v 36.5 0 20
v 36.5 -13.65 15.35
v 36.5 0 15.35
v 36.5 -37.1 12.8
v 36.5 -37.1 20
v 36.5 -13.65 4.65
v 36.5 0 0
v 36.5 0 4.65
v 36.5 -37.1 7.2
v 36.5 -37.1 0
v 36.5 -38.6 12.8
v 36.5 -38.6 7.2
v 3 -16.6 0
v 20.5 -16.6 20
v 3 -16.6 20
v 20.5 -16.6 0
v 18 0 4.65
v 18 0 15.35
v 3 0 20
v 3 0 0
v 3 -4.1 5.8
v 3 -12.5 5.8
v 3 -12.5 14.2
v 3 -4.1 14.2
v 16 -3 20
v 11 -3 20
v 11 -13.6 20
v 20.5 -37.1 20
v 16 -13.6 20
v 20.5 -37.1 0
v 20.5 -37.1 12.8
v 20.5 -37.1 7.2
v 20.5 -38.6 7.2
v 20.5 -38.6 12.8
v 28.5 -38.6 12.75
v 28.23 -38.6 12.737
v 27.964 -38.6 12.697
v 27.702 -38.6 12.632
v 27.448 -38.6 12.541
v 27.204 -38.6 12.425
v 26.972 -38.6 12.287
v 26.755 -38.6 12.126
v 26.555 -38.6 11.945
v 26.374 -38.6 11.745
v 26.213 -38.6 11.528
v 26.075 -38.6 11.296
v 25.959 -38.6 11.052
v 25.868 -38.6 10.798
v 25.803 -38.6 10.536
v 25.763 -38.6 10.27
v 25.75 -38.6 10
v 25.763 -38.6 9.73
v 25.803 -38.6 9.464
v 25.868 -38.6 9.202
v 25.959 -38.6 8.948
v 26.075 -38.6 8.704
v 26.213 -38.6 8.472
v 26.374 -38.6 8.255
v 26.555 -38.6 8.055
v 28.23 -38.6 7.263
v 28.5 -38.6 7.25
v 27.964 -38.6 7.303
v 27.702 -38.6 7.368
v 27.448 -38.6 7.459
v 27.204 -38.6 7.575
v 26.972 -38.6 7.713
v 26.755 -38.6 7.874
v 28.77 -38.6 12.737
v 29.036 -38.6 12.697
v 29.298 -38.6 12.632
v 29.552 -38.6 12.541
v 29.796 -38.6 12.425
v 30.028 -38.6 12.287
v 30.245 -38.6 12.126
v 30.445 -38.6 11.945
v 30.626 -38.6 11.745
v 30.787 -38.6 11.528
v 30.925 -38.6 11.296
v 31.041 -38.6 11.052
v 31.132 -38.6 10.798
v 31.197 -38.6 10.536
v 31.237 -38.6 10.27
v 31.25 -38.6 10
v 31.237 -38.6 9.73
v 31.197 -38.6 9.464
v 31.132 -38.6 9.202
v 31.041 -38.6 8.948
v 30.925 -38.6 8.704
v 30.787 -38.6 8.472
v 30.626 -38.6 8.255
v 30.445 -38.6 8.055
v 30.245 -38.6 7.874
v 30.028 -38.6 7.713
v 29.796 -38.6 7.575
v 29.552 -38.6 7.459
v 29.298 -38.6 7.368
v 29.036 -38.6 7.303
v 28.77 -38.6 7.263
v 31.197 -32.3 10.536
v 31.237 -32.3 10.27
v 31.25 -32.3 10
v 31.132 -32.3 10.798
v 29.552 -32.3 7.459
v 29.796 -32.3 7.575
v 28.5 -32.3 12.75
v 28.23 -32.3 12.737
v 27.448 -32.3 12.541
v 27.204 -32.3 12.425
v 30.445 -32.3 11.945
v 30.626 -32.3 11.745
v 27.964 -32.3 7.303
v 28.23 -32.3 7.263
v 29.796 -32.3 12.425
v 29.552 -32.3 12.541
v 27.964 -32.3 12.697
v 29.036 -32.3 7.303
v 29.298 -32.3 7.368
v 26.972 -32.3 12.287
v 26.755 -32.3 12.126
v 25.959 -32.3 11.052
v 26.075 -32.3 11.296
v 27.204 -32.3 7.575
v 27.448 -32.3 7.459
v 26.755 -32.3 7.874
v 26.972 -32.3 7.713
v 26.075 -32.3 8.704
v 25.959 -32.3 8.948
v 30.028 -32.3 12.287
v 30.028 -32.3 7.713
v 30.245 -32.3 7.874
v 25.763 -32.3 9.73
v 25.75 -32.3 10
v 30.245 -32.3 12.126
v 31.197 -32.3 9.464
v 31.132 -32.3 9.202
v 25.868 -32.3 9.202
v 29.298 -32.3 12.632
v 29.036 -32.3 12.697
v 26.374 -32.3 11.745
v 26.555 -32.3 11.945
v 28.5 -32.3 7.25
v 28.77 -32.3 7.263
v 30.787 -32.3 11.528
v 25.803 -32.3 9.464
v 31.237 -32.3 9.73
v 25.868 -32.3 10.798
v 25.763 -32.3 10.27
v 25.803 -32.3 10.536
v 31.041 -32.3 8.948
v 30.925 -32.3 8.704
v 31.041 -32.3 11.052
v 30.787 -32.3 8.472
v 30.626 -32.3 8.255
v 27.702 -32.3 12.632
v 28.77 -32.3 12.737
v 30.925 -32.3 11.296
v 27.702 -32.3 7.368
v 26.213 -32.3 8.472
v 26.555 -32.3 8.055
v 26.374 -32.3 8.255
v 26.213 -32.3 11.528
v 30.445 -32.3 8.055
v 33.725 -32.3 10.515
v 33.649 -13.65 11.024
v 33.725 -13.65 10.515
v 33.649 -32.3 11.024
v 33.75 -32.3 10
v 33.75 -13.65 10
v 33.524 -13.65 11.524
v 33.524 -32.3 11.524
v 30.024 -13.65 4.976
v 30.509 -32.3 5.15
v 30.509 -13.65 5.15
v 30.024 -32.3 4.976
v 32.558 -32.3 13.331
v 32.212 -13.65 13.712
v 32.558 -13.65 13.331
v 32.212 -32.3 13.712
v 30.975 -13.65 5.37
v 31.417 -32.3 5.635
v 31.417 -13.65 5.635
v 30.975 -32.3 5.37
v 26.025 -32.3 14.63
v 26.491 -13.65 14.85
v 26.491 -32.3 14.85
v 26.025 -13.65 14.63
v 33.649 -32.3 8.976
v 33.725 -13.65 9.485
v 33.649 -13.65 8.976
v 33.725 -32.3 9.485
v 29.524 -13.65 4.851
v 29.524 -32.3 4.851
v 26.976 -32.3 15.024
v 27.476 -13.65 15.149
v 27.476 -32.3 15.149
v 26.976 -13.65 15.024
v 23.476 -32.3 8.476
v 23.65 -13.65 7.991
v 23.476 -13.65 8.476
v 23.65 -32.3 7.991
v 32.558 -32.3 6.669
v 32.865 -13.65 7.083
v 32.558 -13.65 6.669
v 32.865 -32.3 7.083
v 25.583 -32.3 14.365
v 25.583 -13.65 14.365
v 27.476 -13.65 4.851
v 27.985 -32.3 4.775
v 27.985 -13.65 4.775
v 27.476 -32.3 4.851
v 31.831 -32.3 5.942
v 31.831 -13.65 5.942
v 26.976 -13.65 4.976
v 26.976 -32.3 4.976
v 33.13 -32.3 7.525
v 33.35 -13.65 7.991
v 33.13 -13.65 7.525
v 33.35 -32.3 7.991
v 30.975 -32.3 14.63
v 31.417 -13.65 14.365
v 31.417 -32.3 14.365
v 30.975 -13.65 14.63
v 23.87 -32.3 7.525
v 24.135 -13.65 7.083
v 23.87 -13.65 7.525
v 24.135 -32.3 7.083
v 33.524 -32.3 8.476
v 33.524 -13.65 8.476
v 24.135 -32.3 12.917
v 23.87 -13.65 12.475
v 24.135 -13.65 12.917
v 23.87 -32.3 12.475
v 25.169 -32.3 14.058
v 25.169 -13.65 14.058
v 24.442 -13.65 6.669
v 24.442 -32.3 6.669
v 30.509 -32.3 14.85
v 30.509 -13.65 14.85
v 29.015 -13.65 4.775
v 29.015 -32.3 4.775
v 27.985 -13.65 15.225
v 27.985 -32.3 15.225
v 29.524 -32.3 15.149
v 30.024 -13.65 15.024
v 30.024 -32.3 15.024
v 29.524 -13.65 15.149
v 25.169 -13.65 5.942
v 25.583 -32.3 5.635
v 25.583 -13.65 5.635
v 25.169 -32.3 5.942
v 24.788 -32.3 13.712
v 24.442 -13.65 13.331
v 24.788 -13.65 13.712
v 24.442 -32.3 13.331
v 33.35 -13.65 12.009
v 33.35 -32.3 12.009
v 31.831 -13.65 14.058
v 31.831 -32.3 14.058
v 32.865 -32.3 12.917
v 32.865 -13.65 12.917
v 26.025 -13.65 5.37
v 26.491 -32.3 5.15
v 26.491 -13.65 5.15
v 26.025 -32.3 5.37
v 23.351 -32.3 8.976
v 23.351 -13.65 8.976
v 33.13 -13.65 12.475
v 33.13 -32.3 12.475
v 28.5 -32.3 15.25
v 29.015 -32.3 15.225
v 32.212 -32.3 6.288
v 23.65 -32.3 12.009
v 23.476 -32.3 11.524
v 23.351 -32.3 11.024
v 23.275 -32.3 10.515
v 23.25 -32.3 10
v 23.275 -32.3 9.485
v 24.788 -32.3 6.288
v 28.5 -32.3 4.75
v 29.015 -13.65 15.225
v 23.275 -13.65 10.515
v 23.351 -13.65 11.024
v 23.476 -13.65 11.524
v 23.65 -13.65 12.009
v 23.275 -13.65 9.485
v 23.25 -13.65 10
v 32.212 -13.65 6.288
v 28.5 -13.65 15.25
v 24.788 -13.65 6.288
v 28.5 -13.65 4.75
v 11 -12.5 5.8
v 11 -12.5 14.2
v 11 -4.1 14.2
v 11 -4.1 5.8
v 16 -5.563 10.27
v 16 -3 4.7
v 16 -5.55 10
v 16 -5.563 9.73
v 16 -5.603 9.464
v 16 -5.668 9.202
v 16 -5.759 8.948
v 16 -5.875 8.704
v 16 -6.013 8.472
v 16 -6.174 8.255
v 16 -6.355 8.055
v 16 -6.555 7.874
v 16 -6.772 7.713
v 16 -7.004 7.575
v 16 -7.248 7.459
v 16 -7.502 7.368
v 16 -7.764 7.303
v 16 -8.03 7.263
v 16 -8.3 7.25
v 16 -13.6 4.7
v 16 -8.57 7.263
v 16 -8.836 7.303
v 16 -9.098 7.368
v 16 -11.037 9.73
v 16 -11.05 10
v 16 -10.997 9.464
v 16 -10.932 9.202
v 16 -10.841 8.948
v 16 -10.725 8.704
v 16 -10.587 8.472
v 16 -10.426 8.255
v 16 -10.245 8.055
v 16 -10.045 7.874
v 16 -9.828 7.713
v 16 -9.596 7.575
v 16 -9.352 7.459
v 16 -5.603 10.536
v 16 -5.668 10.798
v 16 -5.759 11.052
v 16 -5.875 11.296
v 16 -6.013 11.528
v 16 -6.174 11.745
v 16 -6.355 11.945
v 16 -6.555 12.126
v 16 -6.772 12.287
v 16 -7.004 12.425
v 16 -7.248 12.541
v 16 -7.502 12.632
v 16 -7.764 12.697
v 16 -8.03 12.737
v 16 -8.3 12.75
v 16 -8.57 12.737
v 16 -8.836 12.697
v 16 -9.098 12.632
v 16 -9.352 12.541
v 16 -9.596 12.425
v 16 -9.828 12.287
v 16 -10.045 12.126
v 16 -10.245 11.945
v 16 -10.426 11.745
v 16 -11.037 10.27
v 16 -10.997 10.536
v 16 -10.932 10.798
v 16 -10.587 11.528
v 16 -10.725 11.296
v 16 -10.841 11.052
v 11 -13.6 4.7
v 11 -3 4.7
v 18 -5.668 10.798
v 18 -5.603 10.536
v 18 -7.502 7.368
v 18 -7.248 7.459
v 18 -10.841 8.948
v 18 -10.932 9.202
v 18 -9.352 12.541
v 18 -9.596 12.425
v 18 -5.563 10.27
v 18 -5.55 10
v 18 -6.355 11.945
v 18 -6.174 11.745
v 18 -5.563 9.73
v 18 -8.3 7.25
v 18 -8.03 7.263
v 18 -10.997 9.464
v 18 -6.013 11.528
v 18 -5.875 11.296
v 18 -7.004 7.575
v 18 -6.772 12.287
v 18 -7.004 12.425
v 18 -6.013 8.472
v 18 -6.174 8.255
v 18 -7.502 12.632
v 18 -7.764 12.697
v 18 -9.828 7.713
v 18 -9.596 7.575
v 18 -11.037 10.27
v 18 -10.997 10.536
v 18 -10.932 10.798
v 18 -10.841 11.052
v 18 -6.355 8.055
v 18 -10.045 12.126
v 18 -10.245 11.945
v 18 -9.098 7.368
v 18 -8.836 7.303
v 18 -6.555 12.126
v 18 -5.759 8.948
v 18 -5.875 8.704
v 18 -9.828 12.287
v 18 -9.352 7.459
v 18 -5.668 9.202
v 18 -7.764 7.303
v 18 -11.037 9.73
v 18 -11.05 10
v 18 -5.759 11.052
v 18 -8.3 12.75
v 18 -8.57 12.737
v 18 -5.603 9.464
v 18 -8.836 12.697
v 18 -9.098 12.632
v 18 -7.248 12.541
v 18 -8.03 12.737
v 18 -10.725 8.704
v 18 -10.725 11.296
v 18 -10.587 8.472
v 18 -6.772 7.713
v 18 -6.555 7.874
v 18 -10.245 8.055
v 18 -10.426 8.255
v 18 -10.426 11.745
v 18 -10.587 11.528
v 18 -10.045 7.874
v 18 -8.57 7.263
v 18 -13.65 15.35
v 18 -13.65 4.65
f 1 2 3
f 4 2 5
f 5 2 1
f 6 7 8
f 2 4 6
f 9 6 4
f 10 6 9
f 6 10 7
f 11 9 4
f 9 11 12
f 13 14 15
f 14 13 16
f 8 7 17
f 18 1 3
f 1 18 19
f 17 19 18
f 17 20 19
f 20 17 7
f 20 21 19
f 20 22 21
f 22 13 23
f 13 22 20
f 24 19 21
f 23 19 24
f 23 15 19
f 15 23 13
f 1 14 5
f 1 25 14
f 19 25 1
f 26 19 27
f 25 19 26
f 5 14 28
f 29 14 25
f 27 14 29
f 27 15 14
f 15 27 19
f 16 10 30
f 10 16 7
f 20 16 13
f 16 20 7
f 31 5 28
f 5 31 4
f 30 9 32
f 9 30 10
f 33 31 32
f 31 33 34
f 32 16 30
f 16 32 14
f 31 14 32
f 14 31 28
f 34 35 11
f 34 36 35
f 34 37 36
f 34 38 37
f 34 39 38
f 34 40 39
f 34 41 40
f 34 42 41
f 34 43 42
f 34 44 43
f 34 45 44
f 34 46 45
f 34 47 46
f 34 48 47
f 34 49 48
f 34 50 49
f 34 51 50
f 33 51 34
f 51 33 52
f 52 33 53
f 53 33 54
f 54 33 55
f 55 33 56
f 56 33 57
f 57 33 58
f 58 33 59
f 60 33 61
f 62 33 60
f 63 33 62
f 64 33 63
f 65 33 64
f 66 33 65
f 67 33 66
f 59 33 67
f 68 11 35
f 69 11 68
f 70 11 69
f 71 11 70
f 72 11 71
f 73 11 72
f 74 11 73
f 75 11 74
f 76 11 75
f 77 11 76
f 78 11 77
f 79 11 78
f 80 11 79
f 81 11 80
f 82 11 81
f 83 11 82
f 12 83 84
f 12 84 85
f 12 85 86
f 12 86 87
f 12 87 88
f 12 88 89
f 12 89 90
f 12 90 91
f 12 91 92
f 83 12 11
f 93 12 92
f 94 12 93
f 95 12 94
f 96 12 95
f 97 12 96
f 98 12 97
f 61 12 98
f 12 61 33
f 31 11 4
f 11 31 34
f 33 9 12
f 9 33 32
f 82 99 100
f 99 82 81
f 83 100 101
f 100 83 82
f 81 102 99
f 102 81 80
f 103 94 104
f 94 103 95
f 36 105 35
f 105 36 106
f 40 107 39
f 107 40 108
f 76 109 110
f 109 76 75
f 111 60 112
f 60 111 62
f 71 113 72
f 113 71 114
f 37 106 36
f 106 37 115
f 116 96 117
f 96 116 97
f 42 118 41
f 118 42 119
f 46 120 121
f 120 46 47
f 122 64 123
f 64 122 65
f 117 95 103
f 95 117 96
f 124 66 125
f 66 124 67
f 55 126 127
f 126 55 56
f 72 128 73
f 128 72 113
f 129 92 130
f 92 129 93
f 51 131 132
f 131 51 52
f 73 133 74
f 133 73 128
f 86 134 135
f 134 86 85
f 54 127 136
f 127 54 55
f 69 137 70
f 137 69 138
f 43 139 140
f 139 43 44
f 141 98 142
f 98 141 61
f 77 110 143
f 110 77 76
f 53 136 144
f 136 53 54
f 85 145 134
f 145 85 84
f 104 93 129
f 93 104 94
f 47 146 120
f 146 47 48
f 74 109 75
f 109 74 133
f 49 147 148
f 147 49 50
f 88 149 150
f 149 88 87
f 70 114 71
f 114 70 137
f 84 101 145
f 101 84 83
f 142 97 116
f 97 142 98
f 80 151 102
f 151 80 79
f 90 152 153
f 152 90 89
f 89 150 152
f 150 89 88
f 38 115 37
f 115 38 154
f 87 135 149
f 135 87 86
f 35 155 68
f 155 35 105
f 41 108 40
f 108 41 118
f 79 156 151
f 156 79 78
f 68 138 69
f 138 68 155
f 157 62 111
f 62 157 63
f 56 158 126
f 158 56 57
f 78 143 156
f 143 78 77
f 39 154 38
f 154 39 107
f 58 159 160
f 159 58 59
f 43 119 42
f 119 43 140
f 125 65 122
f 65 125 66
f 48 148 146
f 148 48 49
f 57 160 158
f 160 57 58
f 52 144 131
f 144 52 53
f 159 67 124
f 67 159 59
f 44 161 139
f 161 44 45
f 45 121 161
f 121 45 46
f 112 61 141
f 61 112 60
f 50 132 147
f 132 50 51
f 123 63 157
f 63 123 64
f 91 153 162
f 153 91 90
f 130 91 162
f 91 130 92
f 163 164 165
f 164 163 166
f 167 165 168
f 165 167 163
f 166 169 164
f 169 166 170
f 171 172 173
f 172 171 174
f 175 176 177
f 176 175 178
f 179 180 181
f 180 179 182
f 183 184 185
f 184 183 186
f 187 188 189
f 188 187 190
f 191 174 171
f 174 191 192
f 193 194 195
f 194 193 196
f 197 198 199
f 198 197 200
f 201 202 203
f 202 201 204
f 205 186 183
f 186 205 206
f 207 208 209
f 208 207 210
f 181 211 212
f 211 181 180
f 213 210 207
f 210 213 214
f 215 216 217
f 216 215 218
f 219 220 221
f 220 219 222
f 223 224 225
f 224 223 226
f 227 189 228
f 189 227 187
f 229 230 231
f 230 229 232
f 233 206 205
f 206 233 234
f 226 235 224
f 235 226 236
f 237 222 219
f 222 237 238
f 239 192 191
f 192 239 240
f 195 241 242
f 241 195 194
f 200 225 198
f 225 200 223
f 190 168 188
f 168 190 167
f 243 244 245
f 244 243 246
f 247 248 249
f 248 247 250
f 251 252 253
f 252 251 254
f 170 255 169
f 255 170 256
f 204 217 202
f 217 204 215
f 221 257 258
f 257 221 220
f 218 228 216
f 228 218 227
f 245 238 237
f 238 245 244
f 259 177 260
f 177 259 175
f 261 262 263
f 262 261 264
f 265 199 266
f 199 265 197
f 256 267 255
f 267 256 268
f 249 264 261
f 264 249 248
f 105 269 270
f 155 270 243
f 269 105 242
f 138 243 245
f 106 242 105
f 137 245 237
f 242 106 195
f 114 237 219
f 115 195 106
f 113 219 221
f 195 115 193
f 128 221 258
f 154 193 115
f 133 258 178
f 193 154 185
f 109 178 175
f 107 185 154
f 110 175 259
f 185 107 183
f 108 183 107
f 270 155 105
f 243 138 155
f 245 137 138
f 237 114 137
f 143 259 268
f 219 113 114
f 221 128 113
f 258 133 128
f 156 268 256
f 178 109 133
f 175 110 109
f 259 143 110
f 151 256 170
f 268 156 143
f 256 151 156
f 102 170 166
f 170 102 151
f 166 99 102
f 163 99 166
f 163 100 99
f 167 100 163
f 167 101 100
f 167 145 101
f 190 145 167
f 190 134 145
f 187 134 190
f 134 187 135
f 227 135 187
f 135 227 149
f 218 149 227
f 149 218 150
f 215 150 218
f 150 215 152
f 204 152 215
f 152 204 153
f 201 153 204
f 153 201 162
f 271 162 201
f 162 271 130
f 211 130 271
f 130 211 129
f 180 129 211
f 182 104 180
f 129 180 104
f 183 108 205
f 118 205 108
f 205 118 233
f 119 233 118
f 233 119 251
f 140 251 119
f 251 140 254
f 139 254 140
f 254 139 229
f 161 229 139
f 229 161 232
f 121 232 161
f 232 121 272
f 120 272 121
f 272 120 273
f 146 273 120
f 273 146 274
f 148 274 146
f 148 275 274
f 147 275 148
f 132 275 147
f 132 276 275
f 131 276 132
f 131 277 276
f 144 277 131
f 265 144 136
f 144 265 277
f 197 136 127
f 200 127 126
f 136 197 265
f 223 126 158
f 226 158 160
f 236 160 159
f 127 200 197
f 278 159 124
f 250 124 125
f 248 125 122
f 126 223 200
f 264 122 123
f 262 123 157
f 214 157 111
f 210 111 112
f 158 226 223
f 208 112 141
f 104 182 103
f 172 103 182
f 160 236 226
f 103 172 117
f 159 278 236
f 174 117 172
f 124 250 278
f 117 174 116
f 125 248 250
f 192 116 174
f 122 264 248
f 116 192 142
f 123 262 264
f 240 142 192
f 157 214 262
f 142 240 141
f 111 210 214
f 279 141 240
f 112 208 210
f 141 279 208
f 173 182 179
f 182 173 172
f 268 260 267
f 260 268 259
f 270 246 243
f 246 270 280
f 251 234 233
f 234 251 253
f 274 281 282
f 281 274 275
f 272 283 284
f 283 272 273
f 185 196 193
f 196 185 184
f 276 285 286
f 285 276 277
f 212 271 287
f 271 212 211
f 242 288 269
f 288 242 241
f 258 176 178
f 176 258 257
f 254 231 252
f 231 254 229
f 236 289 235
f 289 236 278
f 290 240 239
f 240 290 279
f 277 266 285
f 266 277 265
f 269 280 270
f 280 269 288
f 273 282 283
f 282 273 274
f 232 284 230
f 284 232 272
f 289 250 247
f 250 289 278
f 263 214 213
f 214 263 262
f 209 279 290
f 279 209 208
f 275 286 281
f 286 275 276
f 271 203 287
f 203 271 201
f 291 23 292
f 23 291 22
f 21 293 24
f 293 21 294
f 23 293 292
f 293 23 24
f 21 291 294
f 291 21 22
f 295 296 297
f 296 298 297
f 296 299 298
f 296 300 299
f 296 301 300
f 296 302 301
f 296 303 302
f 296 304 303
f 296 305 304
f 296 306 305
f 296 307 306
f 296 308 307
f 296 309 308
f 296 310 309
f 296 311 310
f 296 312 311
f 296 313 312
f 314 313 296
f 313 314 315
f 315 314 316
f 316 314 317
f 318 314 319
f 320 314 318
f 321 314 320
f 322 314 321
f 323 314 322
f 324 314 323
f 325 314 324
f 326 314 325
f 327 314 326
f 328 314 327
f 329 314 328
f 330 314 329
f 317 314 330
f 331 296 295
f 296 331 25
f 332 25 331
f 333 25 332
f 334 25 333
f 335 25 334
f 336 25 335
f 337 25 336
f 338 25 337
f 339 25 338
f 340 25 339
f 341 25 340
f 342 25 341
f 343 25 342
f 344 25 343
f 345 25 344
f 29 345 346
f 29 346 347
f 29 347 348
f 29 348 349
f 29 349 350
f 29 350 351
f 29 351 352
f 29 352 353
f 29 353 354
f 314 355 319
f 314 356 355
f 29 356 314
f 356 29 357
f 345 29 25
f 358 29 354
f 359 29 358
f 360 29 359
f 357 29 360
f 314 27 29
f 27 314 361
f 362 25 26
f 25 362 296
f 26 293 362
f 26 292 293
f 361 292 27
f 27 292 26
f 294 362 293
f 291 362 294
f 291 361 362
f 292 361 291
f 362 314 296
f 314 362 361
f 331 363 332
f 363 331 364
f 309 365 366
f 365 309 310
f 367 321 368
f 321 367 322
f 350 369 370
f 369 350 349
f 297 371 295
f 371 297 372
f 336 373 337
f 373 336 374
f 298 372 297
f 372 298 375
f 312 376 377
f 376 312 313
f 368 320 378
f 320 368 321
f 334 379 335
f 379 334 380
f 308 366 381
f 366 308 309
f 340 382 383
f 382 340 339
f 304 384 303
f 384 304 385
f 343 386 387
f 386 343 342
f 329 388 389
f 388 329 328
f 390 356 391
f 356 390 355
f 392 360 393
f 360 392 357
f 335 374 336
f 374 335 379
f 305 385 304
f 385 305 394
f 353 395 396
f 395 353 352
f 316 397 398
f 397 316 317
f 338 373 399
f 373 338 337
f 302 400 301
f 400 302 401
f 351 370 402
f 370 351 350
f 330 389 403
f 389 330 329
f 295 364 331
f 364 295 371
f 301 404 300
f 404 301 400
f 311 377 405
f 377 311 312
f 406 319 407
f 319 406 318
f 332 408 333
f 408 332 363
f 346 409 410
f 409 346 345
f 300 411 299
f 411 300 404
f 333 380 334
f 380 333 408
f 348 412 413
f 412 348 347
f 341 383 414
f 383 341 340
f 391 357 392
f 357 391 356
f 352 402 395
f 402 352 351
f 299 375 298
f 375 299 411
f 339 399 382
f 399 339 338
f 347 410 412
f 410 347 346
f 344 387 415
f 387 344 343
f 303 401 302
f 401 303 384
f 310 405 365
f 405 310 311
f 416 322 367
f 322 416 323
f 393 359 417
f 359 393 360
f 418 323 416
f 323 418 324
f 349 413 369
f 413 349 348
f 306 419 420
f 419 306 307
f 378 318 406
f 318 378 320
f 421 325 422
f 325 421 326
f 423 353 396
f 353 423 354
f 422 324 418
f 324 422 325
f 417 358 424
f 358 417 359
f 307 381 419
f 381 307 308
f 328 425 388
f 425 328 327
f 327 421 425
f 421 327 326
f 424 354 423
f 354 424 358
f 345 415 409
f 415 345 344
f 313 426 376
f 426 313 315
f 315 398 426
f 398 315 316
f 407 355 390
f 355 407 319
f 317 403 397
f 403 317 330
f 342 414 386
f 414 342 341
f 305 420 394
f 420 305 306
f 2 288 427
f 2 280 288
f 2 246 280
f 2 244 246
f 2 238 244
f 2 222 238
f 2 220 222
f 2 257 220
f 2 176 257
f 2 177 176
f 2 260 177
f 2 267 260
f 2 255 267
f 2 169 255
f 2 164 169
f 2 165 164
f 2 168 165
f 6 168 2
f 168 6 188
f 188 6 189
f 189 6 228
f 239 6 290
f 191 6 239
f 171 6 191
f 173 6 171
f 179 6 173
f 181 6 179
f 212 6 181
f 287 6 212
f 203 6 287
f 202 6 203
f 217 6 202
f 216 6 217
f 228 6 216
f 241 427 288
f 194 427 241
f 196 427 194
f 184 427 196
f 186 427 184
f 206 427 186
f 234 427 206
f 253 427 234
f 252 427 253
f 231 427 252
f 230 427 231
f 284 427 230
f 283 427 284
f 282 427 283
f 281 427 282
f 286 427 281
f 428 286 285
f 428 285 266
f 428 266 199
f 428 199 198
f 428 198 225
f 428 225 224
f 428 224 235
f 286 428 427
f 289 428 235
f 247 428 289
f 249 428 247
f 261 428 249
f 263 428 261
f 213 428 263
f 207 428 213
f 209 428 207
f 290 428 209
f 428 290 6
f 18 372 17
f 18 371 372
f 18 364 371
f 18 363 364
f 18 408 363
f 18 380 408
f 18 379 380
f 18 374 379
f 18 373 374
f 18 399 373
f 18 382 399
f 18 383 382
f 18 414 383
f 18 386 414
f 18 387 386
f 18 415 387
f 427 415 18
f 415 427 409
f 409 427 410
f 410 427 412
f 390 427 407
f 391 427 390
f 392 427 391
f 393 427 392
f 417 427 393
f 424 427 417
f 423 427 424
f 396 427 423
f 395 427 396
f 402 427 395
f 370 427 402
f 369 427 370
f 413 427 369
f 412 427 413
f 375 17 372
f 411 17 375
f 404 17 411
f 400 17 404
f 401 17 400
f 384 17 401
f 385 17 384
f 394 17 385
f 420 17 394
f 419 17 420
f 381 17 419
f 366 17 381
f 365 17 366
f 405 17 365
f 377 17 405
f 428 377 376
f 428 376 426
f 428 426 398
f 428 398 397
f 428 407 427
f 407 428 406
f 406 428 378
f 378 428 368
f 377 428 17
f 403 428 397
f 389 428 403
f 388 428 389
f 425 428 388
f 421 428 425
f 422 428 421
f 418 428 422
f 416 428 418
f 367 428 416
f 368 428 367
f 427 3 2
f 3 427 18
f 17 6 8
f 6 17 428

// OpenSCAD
// Tensioner block: bolts to the rail outside a post; its push bolt moves the post inward. Print 2.
// Print orientation: closed Y face on the bed, T-nut pocket opening up.
include <params.scad>
include <lib.scad>

rotate([90, 0, 0]) translate([0, ten_w / 2, -ten_arm_z0]) tensioner_block();
